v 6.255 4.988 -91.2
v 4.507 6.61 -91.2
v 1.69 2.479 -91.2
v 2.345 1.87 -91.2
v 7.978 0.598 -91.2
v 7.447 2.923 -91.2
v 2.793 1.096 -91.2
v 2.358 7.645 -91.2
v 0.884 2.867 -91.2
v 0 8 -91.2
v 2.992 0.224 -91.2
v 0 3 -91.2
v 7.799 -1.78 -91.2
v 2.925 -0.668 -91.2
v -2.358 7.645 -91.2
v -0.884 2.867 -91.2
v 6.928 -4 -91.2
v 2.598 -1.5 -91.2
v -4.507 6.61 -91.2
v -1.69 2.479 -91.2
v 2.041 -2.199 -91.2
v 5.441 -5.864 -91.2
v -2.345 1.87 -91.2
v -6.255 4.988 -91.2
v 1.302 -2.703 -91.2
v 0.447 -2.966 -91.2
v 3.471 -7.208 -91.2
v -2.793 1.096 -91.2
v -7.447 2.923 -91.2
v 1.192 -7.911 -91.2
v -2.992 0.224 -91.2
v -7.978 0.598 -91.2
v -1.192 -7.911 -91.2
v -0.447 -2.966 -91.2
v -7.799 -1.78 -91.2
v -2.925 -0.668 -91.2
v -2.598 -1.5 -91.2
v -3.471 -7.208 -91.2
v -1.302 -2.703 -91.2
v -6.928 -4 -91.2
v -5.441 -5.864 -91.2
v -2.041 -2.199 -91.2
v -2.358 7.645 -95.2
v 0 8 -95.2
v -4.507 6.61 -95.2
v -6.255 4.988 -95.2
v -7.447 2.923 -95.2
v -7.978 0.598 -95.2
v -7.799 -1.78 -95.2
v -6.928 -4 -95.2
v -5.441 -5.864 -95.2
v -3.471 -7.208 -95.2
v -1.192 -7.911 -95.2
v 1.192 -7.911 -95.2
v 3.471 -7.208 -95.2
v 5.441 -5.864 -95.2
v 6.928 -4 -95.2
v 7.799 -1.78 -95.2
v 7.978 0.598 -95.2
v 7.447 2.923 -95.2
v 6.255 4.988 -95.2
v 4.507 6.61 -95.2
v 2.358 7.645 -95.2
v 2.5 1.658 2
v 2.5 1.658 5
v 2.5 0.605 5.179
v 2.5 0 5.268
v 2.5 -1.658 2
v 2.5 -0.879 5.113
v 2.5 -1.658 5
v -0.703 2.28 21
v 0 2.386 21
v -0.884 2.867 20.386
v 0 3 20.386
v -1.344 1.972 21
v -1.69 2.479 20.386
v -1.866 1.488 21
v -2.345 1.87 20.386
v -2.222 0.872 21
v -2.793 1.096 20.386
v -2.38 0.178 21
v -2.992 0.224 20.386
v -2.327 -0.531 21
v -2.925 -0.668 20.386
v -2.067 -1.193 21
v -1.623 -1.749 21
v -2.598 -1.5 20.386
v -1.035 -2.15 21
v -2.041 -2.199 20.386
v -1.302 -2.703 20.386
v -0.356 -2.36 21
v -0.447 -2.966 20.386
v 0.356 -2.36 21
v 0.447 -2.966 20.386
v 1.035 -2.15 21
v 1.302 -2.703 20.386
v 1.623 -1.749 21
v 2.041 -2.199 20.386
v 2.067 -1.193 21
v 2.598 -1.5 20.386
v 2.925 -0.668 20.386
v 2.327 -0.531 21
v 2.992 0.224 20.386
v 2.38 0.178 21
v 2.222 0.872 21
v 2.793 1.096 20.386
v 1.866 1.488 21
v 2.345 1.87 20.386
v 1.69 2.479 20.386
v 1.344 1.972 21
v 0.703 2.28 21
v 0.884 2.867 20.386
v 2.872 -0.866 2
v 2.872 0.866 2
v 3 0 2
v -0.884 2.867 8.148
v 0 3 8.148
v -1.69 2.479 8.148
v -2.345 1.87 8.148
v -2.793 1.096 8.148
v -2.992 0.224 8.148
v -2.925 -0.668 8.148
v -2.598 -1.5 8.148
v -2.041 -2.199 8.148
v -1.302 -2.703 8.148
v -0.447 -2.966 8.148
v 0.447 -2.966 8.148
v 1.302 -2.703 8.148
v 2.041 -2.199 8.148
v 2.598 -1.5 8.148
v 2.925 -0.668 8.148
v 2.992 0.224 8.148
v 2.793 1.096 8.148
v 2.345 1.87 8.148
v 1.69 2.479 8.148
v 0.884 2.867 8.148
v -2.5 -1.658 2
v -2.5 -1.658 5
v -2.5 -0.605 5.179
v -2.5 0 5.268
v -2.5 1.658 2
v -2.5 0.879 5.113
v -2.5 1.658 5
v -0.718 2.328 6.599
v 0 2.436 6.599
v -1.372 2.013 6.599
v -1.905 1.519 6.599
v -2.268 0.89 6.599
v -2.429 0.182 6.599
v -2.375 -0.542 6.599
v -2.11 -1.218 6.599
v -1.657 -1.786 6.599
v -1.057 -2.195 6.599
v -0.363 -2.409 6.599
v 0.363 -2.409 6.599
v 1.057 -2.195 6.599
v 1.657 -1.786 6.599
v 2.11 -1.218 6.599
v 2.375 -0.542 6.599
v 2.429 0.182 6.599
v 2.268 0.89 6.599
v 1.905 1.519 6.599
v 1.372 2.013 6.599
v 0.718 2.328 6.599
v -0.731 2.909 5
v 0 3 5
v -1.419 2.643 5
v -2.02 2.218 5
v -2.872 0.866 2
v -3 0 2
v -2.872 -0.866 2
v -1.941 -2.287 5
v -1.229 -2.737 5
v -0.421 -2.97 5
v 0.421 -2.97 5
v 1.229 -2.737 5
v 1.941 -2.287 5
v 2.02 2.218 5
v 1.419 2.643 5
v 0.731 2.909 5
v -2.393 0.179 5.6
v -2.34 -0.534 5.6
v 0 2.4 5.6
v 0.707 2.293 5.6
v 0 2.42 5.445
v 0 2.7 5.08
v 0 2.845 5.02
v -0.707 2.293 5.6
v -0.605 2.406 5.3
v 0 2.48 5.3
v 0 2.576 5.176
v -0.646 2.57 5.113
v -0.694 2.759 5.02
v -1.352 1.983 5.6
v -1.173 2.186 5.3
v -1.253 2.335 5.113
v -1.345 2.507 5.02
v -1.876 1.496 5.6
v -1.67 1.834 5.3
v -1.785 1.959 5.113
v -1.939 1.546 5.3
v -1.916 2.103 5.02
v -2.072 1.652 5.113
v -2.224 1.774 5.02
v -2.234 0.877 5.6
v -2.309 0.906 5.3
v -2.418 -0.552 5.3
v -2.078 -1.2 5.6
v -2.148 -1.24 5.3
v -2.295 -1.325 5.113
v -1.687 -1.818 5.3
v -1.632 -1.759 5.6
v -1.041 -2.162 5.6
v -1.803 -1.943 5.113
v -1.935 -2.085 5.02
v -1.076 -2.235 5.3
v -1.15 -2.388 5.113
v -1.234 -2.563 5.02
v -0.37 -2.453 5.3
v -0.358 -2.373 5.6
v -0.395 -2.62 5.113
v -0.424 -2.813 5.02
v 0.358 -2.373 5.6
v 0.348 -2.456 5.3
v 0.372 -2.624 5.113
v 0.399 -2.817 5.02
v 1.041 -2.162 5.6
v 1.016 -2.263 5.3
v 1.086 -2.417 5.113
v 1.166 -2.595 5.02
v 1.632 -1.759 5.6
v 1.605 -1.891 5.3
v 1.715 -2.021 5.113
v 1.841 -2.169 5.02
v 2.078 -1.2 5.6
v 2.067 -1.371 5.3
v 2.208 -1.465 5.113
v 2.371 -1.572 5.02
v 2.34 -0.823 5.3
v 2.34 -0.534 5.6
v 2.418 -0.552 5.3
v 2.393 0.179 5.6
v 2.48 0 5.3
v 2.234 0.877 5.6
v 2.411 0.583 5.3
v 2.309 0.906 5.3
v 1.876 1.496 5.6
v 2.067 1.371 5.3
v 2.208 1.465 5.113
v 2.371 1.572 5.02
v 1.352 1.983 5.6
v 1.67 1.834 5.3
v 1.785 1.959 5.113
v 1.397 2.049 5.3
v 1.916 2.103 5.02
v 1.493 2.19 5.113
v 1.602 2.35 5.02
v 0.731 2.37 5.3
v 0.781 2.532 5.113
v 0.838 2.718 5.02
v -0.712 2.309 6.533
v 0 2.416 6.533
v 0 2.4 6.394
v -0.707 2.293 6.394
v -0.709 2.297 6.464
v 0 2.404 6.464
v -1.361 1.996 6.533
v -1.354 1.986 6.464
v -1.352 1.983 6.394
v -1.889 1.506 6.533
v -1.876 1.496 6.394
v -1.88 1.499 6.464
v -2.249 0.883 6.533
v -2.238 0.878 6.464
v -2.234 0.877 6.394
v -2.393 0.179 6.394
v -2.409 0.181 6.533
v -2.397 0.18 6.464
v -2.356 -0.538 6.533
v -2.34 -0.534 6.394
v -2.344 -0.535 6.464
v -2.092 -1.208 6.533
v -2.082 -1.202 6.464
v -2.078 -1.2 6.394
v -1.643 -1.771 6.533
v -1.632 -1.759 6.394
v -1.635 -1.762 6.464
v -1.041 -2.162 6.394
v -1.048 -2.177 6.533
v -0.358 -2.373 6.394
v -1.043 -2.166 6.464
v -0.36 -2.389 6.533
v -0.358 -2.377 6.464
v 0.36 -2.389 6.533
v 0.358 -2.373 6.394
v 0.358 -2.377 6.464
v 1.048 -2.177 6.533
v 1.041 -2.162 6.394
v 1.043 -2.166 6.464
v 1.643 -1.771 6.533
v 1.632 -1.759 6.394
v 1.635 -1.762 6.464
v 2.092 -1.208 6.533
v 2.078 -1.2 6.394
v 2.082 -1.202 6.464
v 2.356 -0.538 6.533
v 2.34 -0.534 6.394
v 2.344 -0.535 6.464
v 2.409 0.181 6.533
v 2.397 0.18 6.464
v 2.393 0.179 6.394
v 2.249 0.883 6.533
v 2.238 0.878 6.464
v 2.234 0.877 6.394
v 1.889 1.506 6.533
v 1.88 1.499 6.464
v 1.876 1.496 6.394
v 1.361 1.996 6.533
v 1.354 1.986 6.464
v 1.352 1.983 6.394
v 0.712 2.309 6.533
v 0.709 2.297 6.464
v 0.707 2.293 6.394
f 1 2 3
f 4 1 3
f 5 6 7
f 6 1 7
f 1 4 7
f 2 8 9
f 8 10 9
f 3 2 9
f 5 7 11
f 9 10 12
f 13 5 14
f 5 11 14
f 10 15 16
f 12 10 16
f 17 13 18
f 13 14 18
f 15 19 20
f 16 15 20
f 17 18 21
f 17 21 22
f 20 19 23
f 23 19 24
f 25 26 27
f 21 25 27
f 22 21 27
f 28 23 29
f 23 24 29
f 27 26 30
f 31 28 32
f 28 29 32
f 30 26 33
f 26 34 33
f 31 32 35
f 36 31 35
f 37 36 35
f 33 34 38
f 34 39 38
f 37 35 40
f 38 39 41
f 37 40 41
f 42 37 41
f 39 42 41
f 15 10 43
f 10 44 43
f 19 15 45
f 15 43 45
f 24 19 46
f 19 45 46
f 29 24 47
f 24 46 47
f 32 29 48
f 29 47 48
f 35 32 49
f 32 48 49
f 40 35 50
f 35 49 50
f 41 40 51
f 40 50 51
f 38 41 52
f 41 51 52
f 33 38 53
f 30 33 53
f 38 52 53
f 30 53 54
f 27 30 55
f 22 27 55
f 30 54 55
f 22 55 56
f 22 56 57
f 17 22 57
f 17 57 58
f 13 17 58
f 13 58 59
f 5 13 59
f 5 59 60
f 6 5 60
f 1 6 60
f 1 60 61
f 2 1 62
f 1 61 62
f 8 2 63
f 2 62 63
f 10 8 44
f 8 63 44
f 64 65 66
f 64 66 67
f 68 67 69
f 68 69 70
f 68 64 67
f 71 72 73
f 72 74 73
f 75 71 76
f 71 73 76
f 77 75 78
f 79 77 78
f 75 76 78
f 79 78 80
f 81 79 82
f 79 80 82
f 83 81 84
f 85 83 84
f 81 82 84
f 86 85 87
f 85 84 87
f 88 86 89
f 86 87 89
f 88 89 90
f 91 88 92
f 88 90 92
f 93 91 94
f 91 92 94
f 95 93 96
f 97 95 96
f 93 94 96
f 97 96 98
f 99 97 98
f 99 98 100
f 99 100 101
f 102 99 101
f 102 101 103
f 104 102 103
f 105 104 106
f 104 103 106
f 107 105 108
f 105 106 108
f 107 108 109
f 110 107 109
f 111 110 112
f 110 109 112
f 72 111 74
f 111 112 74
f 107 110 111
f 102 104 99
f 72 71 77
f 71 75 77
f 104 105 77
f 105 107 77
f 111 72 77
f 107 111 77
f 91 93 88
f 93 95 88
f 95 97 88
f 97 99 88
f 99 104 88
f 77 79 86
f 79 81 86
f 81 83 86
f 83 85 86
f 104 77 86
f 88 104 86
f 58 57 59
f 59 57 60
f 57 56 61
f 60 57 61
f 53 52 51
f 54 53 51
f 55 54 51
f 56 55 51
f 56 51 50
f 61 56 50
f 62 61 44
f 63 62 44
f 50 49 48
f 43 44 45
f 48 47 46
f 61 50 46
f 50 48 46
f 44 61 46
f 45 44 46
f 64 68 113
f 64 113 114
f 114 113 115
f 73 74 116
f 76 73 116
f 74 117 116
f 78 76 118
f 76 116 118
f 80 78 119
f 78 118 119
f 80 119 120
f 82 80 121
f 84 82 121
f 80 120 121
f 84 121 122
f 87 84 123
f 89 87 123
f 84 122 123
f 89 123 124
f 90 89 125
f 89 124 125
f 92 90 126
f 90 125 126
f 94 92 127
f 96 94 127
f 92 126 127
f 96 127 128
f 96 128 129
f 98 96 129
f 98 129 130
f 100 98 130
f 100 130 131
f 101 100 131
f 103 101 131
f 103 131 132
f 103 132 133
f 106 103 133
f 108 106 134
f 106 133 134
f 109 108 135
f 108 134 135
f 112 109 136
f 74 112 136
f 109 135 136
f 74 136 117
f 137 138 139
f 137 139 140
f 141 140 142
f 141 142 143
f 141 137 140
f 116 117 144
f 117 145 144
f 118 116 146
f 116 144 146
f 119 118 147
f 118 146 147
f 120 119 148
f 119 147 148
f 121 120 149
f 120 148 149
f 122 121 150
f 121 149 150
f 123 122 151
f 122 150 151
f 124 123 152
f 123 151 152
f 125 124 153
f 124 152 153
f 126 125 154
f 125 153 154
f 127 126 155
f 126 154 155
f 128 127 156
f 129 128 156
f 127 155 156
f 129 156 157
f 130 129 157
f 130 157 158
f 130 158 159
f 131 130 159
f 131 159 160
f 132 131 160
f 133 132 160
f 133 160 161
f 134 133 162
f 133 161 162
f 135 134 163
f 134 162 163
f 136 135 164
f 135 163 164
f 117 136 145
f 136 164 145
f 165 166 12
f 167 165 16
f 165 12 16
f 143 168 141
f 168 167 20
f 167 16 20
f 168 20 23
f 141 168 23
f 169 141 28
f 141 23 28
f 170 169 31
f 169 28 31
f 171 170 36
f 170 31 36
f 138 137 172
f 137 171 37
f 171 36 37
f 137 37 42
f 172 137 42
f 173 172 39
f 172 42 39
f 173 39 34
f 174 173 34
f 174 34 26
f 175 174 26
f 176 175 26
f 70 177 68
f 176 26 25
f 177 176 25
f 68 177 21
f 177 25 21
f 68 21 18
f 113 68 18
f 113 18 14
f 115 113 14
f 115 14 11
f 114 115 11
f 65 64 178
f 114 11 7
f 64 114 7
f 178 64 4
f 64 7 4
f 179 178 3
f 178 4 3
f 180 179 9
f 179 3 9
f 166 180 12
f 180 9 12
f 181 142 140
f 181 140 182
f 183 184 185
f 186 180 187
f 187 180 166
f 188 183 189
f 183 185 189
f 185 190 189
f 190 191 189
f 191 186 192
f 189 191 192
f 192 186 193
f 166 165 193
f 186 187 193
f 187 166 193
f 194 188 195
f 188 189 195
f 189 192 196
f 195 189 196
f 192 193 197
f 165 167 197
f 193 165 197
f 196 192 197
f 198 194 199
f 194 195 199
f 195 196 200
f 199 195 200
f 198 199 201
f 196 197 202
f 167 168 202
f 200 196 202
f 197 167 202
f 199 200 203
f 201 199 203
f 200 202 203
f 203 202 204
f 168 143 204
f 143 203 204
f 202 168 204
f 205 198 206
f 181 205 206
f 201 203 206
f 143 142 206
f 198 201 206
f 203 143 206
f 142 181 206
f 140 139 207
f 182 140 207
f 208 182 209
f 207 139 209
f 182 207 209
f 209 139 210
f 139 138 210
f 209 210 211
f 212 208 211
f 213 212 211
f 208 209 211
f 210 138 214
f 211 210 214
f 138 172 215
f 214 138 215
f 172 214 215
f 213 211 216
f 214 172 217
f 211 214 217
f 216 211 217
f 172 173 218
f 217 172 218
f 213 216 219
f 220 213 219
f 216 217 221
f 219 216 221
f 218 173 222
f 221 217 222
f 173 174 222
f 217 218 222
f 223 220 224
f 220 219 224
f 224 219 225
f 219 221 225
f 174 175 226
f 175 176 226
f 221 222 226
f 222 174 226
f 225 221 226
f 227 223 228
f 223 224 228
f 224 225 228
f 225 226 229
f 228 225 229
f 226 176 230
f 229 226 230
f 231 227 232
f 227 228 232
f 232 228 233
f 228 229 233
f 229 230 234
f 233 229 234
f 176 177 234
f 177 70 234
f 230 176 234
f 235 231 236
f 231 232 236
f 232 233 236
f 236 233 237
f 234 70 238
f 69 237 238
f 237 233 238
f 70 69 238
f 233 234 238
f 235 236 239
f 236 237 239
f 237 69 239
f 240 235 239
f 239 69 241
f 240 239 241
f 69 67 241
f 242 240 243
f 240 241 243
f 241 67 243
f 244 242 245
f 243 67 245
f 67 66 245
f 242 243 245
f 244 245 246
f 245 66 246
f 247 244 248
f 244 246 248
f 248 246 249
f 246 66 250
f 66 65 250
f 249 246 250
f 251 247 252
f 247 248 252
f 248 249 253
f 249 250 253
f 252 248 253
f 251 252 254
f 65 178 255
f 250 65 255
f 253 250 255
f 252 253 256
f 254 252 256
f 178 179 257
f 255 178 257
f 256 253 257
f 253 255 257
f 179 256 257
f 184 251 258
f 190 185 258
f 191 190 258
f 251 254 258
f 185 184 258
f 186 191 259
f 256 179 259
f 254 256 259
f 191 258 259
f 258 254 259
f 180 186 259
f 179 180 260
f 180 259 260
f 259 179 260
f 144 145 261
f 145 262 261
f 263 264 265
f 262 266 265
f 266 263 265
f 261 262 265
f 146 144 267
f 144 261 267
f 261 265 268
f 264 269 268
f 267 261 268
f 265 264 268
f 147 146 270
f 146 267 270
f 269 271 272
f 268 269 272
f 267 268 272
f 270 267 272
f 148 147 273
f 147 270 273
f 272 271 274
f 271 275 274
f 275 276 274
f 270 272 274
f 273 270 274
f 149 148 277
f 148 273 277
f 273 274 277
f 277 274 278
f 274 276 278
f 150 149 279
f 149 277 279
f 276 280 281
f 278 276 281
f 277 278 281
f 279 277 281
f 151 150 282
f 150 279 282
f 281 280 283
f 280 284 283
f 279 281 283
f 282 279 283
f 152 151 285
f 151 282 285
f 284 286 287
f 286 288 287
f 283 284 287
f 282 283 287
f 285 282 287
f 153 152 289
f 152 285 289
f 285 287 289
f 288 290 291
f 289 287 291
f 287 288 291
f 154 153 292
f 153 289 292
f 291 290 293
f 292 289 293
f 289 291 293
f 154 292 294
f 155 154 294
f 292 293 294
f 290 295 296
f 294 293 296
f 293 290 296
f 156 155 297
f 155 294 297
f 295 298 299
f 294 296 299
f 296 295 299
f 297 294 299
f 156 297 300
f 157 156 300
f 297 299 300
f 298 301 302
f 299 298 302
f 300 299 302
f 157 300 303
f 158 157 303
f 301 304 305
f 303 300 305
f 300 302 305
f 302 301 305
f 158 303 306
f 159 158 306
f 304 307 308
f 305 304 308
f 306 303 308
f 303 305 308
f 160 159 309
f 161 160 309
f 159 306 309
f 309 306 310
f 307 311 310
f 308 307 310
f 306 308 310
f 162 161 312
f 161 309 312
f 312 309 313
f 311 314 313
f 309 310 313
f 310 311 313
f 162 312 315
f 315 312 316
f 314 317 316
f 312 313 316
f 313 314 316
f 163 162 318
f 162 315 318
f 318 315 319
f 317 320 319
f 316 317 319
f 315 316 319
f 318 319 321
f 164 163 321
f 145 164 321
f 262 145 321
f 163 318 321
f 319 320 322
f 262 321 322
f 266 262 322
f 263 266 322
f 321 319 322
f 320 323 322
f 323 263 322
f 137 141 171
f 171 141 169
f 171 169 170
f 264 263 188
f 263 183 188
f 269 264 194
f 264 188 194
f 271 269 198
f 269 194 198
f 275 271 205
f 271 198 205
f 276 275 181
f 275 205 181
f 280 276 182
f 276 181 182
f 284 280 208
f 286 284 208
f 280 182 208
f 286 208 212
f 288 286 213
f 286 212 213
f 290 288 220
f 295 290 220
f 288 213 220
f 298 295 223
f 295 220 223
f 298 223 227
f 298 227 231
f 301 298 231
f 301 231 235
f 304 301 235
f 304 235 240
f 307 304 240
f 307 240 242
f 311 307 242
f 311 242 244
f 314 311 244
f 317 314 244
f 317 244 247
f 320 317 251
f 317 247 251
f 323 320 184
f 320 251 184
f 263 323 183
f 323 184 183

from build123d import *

# Parameters (mm, degrees)
CUT_EXTRUDE1_DEPTH = 4


with BuildPart() as part:
    # Sketch1 → Revolve1 (revolve)
    with BuildSketch(Plane(origin=(0, 0, 0), x_dir=(0, 0, -1), z_dir=(1, 0, 0))):
        Polygon((-5, 0), (-5, 3), (91.2, 3), (91.2, 8), (95.2, 8), (95.2, 0), align=None)
    revolve(axis=Axis((0, 0, -95.2), (0, 0, 1)))

    # Sketch2 → Revolve2 (revolve)
    with BuildSketch(Plane(origin=(0, 0, 0), x_dir=(0, 0, -1), z_dir=(1, 0, 0))):
        with BuildLine():
            Line((-21, 0), (-21, 2.3865))
            Line((-21, 2.3865), (-20.3865, 3))
            Line((-20.3865, 3), (-8.148486452, 3))
            Line((-8.148486452, 3), (-6.599415898, 2.436184428))
            ThreePointArc((-6.599415898, 2.436184428), (-6.498392718, 2.409115348), (-6.394203812, 2.4))
            Line((-6.394203812, 2.4), (-5.6, 2.4))
            ThreePointArc((-5.6, 2.4), (-5.175735931, 2.575735931), (-5, 3))
            Line((-5, 3), (-4, 3))
            Line((-4, 3), (-4, 0))
            Line((-4, 0), (-21, 0))
        make_face()
    revolve(axis=Axis((0, 0, 4), (0, 0, 1)))

    # Sketch3 → Cut-Extrude1 (cut)
    with BuildSketch(Plane.XY.offset(2)):
        Polygon((-5, 10), (-5, -5), (-2.5, -5), (-2.5, 5), (2.5, 5), (2.5, -5), (5, -5), (5, 10), align=None)
    extrude(amount=CUT_EXTRUDE1_DEPTH, mode=Mode.SUBTRACT)


solid = part.part
